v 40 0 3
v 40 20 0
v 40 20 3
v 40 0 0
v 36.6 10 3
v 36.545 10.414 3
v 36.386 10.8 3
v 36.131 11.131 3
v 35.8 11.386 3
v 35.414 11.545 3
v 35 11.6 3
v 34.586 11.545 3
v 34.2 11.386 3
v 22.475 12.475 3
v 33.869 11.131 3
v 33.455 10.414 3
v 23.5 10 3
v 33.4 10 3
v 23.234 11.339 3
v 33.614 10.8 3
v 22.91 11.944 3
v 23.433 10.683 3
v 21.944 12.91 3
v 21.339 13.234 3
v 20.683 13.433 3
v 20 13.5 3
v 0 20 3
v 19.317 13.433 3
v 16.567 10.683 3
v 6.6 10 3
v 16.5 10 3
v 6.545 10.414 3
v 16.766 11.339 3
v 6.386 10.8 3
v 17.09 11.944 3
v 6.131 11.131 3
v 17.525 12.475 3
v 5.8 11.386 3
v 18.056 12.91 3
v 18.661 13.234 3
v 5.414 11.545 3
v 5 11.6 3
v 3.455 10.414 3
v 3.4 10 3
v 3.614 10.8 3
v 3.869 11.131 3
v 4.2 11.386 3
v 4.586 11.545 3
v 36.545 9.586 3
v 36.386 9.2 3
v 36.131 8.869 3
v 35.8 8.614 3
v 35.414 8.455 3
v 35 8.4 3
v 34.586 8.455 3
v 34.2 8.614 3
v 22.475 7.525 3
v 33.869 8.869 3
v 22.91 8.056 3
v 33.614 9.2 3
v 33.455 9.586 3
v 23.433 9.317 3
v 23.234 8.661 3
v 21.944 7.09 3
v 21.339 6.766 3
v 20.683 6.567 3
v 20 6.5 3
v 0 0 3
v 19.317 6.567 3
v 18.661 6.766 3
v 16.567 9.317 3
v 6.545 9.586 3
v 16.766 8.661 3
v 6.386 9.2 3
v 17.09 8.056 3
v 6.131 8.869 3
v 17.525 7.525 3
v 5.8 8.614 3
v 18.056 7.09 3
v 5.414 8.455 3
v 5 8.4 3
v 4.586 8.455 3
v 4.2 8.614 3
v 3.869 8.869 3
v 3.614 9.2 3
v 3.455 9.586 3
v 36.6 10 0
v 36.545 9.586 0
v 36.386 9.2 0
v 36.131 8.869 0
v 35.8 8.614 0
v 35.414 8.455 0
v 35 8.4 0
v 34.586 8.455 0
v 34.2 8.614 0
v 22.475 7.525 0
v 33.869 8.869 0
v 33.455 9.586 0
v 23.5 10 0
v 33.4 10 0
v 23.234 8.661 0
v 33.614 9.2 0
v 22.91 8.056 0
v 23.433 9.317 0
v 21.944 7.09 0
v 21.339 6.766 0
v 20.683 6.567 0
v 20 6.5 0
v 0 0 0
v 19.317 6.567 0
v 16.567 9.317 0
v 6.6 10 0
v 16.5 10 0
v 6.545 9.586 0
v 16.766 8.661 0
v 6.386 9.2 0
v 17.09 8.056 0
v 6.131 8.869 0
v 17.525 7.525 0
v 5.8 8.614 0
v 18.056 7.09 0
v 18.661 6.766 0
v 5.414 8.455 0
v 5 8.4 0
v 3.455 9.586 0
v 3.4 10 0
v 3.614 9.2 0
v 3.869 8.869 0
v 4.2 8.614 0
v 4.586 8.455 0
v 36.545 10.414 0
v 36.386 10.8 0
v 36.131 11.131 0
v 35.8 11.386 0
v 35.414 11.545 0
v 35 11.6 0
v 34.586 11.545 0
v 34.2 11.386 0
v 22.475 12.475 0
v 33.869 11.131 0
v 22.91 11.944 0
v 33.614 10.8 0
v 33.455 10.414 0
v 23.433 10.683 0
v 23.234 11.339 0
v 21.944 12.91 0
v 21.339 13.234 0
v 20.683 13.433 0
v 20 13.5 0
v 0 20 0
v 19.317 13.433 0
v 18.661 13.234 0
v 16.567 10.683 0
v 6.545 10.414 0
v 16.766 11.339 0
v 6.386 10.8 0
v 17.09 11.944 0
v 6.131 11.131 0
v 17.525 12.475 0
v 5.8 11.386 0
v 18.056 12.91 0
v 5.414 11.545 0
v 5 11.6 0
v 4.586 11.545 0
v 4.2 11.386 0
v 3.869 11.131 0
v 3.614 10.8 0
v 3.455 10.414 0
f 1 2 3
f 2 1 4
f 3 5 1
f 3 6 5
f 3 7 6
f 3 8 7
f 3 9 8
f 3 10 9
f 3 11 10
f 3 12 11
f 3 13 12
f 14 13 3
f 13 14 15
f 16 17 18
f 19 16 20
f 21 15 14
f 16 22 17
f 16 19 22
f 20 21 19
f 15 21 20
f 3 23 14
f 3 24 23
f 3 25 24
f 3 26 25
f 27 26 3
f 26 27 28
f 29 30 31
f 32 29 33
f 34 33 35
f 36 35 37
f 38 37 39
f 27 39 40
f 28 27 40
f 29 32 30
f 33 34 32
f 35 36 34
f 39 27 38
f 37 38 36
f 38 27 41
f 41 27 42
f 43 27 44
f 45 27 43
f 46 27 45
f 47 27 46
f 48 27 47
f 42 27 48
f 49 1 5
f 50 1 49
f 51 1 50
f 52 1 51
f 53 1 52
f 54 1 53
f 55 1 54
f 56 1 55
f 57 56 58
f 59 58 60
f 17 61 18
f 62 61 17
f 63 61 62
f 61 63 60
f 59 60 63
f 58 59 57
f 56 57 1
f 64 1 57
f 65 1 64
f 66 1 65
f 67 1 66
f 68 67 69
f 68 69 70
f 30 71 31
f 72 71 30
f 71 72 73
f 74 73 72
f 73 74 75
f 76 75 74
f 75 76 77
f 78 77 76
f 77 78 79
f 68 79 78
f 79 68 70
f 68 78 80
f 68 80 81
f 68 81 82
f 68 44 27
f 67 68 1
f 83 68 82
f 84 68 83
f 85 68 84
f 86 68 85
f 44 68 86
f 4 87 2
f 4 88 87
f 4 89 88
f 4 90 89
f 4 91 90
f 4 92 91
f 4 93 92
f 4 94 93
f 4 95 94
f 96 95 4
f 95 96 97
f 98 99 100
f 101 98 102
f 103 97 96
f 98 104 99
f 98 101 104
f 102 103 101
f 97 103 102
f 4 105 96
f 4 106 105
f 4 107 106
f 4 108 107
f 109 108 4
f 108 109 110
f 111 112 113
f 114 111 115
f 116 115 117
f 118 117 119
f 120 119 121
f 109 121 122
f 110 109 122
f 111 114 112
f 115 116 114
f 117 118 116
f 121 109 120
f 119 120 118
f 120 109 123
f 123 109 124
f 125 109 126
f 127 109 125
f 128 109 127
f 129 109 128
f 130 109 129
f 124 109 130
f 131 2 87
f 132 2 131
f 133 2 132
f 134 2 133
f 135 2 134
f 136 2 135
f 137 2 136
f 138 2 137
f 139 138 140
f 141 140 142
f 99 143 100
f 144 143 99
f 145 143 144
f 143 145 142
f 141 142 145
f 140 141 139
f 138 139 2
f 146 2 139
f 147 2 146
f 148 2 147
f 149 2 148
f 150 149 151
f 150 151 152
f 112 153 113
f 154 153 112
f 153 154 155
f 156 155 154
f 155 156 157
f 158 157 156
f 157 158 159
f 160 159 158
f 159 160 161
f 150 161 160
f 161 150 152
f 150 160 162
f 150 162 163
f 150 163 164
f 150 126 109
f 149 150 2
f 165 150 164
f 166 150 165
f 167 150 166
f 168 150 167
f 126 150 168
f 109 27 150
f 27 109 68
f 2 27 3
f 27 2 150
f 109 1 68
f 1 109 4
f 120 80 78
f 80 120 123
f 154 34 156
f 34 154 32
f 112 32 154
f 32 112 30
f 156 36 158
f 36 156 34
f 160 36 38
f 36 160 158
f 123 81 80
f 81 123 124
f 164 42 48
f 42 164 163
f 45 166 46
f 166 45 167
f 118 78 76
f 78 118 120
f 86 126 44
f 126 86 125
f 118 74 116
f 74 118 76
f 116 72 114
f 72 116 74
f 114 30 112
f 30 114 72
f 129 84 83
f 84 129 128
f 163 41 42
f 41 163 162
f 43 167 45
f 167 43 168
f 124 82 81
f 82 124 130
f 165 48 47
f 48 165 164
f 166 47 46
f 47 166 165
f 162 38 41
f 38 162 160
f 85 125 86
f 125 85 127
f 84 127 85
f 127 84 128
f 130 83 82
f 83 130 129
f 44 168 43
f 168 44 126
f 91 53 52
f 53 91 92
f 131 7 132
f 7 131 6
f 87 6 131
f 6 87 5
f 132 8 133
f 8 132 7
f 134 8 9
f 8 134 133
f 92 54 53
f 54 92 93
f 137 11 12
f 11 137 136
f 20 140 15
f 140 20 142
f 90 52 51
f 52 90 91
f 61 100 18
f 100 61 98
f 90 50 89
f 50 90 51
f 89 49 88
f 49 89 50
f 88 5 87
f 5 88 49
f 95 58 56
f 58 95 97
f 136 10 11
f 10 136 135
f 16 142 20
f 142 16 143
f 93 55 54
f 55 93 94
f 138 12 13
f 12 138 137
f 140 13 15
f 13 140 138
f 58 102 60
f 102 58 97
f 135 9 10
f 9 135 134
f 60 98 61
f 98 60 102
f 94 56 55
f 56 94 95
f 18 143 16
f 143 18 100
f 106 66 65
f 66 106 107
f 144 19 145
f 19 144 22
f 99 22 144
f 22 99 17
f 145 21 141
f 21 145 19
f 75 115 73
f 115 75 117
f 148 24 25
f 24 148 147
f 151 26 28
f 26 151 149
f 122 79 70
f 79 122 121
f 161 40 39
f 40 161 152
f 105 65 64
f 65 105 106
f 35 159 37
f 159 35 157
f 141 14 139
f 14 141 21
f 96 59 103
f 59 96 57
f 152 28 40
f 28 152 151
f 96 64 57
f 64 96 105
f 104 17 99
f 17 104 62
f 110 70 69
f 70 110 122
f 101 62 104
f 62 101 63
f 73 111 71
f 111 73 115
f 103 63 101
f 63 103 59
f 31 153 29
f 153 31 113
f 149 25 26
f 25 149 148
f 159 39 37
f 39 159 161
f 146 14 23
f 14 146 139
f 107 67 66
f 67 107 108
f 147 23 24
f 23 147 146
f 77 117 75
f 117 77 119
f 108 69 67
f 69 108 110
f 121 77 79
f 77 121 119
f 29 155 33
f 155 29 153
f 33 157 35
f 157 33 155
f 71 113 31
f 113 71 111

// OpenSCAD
// MG996R servo bracket
module mg996r_bracket(t=3){
  difference(){
    cube([40,20,t]);
    translate([5,10,-0.1]) cylinder(h=t+0.2,r=1.6,$fn=24);
    translate([35,10,-0.1]) cylinder(h=t+0.2,r=1.6,$fn=24);
    translate([20,10,-0.1]) cylinder(h=t+0.2,r=3.5,$fn=32);
  }
}
mg996r_bracket();
